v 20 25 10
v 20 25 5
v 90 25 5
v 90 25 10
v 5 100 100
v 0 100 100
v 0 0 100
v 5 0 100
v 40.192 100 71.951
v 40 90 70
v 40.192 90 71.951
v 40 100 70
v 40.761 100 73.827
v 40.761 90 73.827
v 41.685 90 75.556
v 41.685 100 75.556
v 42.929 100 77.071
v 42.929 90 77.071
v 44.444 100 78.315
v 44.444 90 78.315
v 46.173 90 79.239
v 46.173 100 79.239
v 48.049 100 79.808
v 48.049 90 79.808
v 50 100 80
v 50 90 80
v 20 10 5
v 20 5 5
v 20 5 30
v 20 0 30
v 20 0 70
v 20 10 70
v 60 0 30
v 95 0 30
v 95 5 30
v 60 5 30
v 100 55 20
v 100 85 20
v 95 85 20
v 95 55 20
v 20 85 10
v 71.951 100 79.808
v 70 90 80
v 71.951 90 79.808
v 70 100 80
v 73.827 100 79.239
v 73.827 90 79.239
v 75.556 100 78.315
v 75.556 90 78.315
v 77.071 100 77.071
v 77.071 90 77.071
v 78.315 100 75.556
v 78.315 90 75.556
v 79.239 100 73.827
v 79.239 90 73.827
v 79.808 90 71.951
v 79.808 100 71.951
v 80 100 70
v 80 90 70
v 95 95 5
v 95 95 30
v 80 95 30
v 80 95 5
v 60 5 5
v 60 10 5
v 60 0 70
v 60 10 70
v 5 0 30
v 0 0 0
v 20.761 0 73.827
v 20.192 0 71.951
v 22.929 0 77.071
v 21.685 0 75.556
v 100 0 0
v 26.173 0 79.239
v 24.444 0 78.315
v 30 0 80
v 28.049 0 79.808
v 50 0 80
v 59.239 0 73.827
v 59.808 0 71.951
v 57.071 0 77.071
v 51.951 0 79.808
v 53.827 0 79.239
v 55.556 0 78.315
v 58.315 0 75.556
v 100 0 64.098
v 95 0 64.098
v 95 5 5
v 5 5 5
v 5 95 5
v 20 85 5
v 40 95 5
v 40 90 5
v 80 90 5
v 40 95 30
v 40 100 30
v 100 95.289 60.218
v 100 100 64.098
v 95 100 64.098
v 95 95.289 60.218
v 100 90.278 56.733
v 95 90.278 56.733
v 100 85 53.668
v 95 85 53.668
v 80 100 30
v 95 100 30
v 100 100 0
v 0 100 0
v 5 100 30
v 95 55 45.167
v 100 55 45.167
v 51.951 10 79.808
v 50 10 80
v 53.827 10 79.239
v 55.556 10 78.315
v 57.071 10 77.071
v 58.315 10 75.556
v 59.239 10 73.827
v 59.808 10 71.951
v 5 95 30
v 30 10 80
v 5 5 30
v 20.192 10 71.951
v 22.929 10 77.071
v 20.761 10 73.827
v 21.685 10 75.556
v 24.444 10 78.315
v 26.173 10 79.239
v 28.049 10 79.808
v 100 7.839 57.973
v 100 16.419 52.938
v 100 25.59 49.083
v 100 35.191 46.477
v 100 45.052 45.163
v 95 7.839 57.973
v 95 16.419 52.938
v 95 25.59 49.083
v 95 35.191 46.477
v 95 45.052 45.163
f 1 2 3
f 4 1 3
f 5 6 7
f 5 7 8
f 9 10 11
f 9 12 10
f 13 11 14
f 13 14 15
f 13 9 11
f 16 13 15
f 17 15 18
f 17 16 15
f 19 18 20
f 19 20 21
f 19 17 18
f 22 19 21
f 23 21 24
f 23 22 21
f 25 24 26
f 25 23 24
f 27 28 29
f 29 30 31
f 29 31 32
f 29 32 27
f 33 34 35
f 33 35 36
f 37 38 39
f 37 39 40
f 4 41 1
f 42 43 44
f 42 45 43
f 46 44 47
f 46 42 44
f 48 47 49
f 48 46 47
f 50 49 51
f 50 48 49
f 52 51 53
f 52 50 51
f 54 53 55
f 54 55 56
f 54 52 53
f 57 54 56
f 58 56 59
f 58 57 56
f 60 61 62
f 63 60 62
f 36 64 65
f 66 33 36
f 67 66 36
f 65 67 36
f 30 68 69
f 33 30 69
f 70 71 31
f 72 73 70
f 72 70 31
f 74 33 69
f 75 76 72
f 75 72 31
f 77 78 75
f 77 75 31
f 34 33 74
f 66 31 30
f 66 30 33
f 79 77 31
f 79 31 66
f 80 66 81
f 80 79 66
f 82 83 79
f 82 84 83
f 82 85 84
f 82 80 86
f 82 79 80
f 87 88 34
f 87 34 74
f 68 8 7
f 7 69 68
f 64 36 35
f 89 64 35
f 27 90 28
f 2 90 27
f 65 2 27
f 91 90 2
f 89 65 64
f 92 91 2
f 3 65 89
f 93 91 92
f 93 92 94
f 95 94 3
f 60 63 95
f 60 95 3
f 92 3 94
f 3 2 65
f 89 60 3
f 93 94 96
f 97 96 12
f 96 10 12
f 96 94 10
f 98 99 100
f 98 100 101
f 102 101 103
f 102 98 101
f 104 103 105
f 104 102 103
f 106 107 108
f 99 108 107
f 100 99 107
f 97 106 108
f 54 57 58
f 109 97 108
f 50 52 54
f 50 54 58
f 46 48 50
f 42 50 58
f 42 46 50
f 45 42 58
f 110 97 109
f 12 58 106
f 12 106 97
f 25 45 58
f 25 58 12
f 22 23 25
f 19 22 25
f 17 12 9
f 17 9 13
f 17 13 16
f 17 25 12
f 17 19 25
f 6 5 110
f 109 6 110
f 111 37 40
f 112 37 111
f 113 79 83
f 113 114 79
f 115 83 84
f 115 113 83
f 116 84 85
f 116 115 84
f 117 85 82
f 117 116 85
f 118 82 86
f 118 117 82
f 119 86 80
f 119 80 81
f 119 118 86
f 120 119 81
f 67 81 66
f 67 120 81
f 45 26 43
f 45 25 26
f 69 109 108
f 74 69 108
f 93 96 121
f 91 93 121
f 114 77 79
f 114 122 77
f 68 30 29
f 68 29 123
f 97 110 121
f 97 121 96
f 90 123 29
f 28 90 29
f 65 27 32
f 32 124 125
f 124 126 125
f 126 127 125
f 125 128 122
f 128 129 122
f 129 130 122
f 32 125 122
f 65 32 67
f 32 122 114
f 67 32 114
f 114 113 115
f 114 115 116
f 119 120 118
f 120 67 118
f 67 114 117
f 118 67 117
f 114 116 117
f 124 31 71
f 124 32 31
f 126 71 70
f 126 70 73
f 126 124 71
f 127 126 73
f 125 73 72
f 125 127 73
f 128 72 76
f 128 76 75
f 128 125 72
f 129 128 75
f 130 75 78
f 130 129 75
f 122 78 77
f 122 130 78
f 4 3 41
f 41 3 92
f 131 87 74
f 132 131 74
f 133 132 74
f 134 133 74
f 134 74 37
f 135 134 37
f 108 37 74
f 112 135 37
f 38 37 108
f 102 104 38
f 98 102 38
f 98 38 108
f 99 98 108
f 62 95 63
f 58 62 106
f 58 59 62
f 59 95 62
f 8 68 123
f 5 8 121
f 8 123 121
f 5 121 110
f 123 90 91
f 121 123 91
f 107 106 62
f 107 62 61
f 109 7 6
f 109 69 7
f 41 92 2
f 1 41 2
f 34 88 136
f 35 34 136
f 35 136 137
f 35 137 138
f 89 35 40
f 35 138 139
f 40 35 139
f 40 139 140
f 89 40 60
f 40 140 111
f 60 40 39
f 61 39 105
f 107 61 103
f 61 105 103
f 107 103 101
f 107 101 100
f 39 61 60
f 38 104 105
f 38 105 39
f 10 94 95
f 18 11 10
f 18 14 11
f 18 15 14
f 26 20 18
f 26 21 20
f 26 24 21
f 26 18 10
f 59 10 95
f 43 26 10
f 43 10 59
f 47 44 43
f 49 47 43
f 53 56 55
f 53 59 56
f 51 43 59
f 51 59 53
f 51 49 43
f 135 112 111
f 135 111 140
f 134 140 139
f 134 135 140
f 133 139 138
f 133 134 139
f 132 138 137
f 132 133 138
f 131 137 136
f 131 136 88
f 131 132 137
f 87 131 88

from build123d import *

# Parameters (mm, degrees)
F0_W      = 100
F0_H      = 100
F1_DEPTH  = 5
F2_W      = 5
F2_H      = 100
F3_DEPTH  = 95
F5_DEPTH  = 5
F7_DEPTH  = 5
F9_DEPTH  = 5
F11_DEPTH = 5
F12_W     = 40
F12_H     = 5
F13_DEPTH = 75
F14_W     = 40
F14_H     = 5
F15_DEPTH = 75
F16_R     = 10


with BuildPart() as f1:
    # F0 (on Top) → F1 (new body)
    with BuildSketch(Plane.XY):
        with Locations((50, 50)):
            Rectangle(F0_W, F0_H)
    extrude(amount=F1_DEPTH)

    # F2 (on face) → F3 (join)
    with BuildSketch(Plane.XY.offset(5)):
        with Locations((2.5, 50)):
            Rectangle(F2_W, F2_H)
    extrude(amount=F3_DEPTH)

    # F4 (on face) → F5 (join)
    with BuildSketch(Plane.XY.offset(5)):
        Polygon((90, 25), (20, 85), (20, 25), align=None)
    extrude(amount=F5_DEPTH)

    # F6 (on face) → F7 (join)
    with BuildSketch(Plane.YZ.offset(100)):
        with BuildLine():
            Line((0, 64.098301), (0, 5))
            Line((0, 5), (100, 5))
            Line((100, 5), (100, 64.098301))
            ThreePointArc((100, 64.098301), (92.818809, 58.42444), (85, 53.667504))
            Line((85, 53.667504), (85, 20))
            Line((85, 20), (55, 20))
            Line((55, 20), (55, 45.166852))
            ThreePointArc((55, 45.166852), (25.589962, 49.083499), (0, 64.098301))
        make_face()
    extrude(amount=-F7_DEPTH)

    # F8 (on face) → F9 (join)
    with BuildSketch(Plane.XZ):
        Polygon((5, 30), (5, 5), (95, 5), (95, 30), (60, 30), (60, 80), (20, 80), (20, 30), align=None)
    extrude(amount=-F9_DEPTH)

    # F10 (on face) → F11 (join)
    with BuildSketch(Plane(origin=(0, 100, 0), x_dir=(-1, 0, 0), z_dir=(0, 1, 0))):
        Polygon((-95, 5), (-5, 5), (-5, 30), (-40, 30), (-40, 80), (-80, 80), (-80, 30), (-95, 30), align=None)
    extrude(amount=-F11_DEPTH)

    # F12 (on face) → F13 (join, through all)
    with BuildSketch(Plane.XY.offset(80)):
        with Locations((40, 7.5)):
            Rectangle(F12_W, F12_H)
    extrude(amount=-F13_DEPTH)

    # F14 (on face) → F15 (join, through all)
    with BuildSketch(Plane.XY.offset(80)):
        with Locations((60, 92.5)):
            Rectangle(F14_W, F14_H)
    extrude(amount=-F15_DEPTH)

    # F16
    f16_edges = [f1.edges().sort_by_distance(p)[0] for p in [
        (60, 5, 80),
        (20, 5, 80),
        (80, 95, 80),
        (40, 95, 80),
    ]]
    fillet(f16_edges, radius=F16_R)


solid = f1.part
